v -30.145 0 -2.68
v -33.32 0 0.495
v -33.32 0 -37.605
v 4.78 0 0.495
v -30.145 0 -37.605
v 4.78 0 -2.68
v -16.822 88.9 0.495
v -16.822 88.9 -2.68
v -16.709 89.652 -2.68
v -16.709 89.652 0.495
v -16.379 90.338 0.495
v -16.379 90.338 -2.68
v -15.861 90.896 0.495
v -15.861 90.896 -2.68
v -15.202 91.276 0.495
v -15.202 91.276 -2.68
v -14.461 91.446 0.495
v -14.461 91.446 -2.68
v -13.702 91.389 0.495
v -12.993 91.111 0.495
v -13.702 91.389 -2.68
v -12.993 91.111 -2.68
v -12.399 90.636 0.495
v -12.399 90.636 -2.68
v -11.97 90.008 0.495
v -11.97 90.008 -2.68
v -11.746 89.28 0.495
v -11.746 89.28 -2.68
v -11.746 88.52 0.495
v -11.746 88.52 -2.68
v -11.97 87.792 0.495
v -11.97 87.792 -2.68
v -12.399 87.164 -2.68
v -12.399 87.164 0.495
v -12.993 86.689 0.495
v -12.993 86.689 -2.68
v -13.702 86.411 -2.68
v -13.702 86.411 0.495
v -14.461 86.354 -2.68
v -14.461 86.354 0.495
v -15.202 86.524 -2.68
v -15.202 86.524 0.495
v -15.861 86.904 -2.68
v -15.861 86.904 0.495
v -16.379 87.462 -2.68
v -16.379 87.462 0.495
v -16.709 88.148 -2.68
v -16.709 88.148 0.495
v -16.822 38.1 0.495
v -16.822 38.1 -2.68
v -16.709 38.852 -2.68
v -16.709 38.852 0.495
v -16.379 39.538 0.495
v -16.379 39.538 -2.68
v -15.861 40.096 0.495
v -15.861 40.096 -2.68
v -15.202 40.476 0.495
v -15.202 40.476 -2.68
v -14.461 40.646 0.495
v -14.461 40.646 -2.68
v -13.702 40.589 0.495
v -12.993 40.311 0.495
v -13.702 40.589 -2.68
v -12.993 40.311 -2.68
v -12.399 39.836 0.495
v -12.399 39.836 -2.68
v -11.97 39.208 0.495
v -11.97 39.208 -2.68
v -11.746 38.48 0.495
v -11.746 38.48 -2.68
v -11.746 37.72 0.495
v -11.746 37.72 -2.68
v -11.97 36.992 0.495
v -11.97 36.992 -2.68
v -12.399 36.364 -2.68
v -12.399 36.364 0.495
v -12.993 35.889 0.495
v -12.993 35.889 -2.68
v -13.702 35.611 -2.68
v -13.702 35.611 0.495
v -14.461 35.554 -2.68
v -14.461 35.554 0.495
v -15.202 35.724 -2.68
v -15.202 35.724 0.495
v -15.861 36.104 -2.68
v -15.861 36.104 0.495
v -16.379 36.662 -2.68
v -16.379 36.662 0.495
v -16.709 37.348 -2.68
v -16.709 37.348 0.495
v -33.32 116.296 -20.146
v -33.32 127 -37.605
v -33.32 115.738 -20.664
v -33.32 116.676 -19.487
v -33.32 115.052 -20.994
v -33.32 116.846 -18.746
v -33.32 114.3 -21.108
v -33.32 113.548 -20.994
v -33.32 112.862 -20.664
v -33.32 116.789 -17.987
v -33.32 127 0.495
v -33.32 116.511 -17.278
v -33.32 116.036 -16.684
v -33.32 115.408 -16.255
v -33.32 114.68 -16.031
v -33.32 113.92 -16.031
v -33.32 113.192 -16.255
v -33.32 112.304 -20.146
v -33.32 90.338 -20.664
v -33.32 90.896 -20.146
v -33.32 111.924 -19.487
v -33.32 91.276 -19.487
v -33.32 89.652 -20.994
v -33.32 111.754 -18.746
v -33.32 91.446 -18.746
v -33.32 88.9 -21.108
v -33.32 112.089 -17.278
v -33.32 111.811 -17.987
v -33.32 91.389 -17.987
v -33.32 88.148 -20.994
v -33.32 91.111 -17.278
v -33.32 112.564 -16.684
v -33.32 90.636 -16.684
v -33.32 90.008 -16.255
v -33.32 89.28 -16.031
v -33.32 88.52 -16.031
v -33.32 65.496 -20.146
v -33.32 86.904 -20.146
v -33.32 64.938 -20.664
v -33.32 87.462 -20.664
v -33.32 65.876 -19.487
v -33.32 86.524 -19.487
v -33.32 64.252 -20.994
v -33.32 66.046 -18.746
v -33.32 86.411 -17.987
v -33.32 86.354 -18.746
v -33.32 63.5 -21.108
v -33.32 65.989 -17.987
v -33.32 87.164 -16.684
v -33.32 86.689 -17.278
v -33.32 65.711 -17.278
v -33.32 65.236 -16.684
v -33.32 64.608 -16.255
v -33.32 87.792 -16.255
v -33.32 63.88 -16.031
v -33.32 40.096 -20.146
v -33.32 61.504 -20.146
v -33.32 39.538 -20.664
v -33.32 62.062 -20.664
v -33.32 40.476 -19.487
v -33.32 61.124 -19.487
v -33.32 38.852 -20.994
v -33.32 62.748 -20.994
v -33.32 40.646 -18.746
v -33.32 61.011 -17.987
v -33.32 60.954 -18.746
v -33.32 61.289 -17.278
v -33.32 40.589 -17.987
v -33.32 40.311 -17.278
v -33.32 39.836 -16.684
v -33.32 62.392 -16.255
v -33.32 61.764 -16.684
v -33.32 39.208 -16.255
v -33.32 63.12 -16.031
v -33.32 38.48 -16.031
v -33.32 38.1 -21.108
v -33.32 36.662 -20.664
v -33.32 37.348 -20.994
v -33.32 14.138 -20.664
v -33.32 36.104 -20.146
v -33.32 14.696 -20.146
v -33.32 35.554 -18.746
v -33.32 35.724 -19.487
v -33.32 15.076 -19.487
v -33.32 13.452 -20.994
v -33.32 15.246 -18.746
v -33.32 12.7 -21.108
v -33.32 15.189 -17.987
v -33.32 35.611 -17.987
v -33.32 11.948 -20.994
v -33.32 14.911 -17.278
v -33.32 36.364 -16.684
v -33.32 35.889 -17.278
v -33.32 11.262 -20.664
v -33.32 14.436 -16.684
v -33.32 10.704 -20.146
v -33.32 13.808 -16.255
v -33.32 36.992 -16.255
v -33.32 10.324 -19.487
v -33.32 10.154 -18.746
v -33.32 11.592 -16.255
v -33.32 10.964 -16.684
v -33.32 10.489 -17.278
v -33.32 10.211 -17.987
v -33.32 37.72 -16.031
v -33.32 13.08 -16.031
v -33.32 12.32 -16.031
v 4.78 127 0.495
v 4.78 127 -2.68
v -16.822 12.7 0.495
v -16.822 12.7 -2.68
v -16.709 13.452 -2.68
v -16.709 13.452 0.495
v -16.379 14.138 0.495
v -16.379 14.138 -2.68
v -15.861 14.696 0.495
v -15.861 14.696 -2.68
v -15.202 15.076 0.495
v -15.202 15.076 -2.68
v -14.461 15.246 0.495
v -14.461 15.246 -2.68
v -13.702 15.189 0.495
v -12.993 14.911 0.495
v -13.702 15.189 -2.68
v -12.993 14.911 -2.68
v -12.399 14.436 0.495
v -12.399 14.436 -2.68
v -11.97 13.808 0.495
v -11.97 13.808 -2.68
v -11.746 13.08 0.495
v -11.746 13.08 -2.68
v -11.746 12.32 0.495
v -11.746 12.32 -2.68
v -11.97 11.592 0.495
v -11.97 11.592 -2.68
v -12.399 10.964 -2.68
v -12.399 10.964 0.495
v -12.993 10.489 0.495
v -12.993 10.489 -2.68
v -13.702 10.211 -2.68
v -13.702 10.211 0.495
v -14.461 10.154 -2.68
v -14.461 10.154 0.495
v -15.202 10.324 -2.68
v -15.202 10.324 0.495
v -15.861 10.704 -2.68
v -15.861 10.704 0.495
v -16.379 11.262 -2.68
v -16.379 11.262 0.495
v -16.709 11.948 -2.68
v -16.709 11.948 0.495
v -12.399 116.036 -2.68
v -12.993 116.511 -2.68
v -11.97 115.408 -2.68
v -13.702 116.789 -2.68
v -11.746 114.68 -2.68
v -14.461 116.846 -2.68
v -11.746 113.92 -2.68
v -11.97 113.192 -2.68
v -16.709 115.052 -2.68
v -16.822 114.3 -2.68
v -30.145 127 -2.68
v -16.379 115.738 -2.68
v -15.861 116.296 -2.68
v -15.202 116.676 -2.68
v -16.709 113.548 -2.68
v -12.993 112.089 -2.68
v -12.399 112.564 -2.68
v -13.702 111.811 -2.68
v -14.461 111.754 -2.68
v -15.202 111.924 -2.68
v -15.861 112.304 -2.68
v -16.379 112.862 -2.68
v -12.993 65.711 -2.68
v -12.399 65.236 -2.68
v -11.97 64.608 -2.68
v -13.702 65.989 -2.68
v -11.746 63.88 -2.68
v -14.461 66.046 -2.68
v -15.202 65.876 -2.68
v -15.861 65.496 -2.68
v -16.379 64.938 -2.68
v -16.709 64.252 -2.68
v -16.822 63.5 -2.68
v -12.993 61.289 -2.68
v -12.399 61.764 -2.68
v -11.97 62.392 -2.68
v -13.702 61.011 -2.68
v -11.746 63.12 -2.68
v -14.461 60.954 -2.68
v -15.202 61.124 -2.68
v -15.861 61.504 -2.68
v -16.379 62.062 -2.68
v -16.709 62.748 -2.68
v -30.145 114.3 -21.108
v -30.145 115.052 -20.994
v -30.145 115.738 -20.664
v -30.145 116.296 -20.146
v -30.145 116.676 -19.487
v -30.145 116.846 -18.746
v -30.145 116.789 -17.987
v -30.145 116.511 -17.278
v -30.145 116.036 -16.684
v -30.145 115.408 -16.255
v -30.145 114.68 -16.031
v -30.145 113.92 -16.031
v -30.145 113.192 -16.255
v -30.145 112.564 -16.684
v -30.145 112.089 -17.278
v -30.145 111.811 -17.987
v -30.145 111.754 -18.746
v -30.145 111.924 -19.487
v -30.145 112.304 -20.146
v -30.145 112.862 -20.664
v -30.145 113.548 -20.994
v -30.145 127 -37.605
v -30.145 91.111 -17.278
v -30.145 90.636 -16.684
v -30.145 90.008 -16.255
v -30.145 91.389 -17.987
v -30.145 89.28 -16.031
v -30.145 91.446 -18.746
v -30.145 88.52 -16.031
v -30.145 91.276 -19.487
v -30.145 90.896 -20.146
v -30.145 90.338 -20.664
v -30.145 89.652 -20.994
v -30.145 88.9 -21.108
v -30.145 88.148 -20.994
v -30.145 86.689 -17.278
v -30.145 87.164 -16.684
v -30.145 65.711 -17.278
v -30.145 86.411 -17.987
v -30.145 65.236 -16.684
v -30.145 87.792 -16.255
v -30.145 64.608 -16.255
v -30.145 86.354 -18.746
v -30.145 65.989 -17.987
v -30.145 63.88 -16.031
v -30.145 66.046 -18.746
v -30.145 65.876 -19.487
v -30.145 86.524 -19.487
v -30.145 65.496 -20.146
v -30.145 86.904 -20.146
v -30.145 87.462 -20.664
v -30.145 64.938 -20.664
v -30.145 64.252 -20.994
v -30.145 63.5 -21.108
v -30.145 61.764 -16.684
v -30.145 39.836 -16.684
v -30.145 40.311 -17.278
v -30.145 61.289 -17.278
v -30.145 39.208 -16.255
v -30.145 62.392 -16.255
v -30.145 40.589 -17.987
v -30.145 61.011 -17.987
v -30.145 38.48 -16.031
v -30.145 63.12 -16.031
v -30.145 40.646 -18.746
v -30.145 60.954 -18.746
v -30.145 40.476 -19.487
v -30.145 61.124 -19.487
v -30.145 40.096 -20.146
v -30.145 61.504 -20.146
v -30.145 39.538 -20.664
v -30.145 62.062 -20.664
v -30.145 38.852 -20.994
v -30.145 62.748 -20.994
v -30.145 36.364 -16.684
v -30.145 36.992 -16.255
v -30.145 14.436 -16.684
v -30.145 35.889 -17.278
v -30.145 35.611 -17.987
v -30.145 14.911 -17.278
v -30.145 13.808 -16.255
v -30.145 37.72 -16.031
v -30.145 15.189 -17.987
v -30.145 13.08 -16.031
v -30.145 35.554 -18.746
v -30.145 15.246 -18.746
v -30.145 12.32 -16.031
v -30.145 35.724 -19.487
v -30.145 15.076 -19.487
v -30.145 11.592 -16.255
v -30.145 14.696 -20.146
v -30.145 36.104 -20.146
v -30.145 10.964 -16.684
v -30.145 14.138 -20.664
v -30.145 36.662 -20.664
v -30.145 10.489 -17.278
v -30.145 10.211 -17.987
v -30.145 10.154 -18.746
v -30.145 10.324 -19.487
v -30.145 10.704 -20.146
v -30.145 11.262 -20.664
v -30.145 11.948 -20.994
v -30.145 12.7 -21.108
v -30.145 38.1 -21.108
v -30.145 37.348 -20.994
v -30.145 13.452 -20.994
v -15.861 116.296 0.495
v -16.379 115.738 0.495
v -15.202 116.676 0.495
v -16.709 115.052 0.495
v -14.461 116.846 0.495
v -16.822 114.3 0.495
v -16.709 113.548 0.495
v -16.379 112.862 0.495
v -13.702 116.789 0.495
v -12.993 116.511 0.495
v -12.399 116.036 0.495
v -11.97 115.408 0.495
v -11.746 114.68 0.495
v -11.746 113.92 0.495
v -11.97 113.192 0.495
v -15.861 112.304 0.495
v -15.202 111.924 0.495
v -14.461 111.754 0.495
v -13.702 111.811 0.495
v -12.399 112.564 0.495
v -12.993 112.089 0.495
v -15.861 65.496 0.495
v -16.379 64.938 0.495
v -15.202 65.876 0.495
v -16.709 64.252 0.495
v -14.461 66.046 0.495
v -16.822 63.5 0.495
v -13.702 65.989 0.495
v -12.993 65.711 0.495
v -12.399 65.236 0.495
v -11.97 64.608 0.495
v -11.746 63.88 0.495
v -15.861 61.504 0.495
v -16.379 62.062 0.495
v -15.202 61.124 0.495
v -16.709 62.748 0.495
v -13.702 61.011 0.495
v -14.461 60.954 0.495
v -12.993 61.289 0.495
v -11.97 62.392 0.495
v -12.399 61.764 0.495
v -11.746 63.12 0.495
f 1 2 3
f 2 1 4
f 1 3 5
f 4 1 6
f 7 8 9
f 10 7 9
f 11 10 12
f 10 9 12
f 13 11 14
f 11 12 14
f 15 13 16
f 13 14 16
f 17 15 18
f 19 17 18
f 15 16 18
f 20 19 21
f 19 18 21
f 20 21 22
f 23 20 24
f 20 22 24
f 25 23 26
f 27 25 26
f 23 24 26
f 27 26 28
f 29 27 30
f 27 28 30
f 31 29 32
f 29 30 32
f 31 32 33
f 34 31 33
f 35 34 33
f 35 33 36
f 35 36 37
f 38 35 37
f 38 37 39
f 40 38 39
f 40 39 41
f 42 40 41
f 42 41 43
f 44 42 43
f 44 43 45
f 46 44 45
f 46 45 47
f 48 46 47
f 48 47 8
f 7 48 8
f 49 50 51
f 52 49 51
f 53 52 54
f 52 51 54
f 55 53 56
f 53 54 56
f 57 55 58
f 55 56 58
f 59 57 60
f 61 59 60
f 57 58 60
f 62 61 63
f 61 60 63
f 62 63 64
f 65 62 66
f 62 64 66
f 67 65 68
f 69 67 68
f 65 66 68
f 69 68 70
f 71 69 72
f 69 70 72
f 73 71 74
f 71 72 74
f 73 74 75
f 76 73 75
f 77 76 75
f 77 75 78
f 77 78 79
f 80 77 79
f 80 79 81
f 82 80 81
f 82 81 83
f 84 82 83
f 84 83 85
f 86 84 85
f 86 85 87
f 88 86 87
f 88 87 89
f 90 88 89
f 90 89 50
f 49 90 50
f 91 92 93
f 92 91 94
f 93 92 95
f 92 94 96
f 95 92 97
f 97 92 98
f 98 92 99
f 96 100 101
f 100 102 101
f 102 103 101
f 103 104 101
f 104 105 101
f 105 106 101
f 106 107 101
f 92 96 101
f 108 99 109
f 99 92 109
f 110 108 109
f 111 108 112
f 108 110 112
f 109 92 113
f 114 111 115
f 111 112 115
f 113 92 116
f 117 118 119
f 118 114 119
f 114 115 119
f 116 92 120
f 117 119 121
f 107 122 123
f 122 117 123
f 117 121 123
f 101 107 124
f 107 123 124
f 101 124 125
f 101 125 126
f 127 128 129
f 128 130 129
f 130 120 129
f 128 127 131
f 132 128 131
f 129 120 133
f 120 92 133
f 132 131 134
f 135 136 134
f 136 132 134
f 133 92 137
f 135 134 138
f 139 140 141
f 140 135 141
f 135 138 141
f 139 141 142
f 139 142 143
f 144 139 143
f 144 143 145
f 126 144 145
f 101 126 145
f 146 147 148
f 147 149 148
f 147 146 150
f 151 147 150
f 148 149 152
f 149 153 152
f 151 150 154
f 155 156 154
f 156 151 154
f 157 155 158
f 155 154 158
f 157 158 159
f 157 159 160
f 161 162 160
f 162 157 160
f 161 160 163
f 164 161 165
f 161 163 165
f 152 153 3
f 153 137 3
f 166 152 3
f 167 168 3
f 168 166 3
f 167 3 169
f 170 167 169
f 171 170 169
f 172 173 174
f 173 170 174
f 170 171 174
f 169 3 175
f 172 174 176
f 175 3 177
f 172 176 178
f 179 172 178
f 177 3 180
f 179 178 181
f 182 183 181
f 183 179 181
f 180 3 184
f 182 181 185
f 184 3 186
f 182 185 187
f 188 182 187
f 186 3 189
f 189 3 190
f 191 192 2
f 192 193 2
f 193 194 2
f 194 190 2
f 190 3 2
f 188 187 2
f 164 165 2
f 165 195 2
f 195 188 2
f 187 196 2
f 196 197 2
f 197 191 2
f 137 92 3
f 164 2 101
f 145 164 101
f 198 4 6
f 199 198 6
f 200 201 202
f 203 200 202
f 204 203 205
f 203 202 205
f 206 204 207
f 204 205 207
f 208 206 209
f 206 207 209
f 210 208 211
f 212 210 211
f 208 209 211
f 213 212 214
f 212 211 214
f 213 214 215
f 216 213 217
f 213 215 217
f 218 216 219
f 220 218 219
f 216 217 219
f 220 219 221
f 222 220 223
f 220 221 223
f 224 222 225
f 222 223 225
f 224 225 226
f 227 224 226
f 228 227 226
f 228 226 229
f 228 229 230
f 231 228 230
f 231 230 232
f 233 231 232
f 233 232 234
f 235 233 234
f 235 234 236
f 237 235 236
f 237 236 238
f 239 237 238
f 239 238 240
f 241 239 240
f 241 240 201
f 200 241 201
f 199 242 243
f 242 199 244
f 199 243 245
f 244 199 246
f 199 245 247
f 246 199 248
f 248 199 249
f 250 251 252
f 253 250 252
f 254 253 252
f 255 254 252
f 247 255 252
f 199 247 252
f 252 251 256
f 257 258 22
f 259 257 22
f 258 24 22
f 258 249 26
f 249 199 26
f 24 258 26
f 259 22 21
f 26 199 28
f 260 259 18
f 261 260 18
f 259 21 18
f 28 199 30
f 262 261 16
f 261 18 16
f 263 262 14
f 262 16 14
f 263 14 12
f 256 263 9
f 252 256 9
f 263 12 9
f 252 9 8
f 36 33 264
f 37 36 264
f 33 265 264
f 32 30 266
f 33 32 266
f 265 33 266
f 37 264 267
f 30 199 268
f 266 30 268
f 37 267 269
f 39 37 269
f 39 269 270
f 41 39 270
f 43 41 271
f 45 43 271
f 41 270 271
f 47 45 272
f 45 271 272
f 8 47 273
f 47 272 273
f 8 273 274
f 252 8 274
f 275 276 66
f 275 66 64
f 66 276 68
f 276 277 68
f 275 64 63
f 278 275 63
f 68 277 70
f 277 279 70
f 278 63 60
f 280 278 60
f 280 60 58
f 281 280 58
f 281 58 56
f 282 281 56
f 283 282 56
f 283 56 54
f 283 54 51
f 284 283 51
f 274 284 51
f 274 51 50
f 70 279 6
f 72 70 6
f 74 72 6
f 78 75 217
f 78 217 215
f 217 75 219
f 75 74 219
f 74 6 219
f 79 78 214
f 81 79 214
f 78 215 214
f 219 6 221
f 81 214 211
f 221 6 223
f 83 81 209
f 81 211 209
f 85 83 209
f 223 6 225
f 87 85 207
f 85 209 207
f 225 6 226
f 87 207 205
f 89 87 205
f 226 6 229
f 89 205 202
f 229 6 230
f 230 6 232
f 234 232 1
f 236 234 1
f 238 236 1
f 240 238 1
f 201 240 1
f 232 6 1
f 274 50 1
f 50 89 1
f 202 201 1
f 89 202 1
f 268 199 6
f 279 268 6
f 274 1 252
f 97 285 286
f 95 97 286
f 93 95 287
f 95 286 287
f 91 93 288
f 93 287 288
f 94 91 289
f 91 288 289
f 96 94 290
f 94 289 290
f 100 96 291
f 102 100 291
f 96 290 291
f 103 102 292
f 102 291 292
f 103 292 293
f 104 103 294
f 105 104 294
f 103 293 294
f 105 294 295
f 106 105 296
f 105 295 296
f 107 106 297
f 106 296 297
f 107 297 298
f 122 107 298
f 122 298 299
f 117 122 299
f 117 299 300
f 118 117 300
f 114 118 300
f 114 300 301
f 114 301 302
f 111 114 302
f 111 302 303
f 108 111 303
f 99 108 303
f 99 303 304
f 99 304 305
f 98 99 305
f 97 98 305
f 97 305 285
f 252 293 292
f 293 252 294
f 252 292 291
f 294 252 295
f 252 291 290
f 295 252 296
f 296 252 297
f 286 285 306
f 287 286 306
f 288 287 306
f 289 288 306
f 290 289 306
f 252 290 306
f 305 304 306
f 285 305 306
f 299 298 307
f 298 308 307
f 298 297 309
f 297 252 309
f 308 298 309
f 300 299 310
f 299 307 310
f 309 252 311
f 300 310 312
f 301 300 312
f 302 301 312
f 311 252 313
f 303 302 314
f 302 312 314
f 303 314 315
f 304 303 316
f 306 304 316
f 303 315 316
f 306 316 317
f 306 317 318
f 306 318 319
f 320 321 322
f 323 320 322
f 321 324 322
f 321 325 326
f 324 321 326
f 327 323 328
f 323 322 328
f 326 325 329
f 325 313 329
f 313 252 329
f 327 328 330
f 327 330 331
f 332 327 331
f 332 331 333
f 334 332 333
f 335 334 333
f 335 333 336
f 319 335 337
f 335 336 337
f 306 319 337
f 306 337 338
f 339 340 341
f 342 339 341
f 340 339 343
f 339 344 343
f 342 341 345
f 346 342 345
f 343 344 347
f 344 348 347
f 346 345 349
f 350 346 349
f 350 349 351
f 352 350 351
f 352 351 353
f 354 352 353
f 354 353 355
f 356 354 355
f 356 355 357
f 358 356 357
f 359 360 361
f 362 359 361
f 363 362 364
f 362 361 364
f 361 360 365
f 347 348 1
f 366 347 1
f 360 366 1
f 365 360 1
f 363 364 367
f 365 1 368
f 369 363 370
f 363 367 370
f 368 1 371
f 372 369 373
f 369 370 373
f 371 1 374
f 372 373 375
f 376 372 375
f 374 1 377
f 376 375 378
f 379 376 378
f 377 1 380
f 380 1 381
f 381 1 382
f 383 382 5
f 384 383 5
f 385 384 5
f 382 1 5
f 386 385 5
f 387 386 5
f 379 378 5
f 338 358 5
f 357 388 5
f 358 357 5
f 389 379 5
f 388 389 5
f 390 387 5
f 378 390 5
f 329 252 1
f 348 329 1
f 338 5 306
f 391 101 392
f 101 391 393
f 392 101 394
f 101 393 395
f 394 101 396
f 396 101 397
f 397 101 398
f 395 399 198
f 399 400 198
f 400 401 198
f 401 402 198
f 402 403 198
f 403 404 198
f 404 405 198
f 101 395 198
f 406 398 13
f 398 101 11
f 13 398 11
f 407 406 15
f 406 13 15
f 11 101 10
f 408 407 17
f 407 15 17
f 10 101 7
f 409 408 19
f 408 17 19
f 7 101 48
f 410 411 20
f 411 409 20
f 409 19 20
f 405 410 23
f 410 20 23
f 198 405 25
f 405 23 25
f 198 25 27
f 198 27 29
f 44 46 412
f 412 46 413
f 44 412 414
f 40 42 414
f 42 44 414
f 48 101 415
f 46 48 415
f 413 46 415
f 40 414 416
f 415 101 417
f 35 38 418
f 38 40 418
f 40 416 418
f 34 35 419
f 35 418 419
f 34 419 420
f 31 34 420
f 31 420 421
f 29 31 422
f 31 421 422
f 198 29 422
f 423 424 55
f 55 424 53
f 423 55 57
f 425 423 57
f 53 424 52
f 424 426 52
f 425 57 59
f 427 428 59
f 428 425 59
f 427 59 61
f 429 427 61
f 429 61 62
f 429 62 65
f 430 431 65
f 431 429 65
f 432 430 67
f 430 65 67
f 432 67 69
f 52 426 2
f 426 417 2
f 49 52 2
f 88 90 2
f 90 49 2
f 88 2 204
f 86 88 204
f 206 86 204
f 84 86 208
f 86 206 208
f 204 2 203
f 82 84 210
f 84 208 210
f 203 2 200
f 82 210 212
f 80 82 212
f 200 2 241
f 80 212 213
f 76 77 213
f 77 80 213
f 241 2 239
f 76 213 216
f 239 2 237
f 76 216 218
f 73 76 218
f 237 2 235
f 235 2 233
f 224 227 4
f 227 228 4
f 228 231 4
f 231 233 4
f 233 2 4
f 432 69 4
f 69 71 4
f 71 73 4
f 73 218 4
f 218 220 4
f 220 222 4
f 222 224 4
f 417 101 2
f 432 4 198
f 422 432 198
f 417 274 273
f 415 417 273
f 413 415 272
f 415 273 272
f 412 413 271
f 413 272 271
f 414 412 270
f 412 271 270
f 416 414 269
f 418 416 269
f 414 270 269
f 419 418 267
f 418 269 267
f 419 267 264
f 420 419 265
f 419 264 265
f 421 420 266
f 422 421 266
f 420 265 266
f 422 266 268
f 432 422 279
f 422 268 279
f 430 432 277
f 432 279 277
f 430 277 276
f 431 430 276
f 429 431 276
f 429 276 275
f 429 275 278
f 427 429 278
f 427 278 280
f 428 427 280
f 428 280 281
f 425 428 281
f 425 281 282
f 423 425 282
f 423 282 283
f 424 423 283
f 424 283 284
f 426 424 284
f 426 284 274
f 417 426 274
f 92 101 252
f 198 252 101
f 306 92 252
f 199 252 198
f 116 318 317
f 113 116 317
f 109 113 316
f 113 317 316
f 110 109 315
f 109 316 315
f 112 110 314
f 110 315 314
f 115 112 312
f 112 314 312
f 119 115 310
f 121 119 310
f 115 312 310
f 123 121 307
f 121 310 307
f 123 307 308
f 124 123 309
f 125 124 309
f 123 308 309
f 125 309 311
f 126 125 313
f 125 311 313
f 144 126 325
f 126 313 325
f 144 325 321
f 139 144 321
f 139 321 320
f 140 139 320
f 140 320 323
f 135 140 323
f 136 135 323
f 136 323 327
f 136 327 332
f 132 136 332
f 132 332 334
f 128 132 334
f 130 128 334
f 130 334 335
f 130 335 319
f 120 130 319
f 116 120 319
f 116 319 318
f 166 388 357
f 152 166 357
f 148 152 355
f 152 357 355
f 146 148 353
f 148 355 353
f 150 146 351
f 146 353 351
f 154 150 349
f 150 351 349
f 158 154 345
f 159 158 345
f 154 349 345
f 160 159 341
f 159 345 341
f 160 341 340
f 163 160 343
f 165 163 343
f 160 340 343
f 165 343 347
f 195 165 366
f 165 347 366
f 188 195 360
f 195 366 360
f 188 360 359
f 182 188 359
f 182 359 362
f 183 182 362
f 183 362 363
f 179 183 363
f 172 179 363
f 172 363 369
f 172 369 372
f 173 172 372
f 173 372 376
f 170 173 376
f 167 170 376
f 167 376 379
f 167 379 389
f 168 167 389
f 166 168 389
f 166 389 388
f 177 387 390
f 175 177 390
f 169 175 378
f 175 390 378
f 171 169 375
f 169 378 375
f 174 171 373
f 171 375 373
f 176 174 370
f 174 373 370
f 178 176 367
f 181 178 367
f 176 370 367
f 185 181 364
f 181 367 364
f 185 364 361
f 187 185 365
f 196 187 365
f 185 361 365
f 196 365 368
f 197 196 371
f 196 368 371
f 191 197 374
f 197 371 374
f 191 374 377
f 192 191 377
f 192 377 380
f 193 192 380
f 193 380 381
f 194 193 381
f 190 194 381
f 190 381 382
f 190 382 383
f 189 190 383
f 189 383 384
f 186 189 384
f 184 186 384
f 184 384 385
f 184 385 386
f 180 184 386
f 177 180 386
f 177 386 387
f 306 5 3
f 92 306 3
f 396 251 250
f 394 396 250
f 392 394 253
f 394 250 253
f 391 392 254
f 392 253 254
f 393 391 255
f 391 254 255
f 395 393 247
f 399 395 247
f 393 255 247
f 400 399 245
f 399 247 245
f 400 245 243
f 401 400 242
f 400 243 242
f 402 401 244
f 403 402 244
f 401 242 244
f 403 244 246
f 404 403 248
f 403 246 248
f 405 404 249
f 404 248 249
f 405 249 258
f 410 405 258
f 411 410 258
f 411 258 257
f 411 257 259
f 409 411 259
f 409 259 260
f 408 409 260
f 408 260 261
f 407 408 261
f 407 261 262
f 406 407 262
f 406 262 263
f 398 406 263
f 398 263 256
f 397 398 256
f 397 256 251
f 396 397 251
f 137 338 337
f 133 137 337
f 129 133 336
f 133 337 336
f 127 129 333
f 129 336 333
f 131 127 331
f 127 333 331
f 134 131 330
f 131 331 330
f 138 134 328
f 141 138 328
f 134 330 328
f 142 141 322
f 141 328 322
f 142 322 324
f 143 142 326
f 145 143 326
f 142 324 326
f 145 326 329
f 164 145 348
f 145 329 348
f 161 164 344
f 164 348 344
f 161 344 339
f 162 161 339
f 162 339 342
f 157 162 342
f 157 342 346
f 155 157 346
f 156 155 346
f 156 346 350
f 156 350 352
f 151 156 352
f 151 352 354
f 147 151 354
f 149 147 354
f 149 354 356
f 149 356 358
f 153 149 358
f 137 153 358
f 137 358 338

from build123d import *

# Parameters (mm, degrees)
BOSS_EXTRUDE1_DEPTH = 127
SKETCH3_R           = 2.5527
CUT_EXTRUDE1_DEPTH  = 137.977657098
LPATTERN1_COUNT     = 5
LPATTERN1_PITCH     = 25.4
SKETCH4_R           = 2.5527
CUT_EXTRUDE2_DEPTH  = 136.863765286
LPATTERN2_COUNT     = 5
LPATTERN2_PITCH     = 25.4


with BuildPart() as part:
    # Sketch2 → Boss-Extrude1 (new body)
    with BuildSketch(Plane(origin=(0, 0, 0), x_dir=(1, 0, 0), z_dir=(0, 1, 0))):
        Polygon((-33.319770297, 37.604825743), (-33.319770297, -0.495174257), (4.780229703, -0.495174257), (4.780229703, 2.679825743), (-30.144770297, 2.679825743), (-30.144770297, 37.604825743), align=None)
    extrude(amount=BOSS_EXTRUDE1_DEPTH)

    # Sketch3 → Cut-Extrude1 (cut, through all)
    with BuildSketch(Plane(origin=(-30.144770297, 0, 0), x_dir=(0, 0, -1), z_dir=(1, 0, 0))):
        with Locations((18.554825743, 12.7)):
            Circle(SKETCH3_R)
    cut_extrude1 = extrude(amount=-CUT_EXTRUDE1_DEPTH, mode=Mode.SUBTRACT)

    # LPattern1: Cut-Extrude1 ×5
    with Locations(*[(0, i * LPATTERN1_PITCH, 0) for i in range(1, LPATTERN1_COUNT)]):
        add(cut_extrude1, mode=Mode.SUBTRACT)

    # Sketch4 → Cut-Extrude2 (cut, through all)
    with BuildSketch(Plane(origin=(0, 0, -2.679825743), x_dir=(-1, 0, 0), z_dir=(0, 0, -1))):
        with Locations((14.269770297, 12.7)):
            Circle(SKETCH4_R)
    cut_extrude2 = extrude(amount=-CUT_EXTRUDE2_DEPTH, mode=Mode.SUBTRACT)

    # LPattern2: Cut-Extrude2 ×5
    with Locations(*[(0, i * LPATTERN2_PITCH, 0) for i in range(1, LPATTERN2_COUNT)]):
        add(cut_extrude2, mode=Mode.SUBTRACT)


solid = part.part
